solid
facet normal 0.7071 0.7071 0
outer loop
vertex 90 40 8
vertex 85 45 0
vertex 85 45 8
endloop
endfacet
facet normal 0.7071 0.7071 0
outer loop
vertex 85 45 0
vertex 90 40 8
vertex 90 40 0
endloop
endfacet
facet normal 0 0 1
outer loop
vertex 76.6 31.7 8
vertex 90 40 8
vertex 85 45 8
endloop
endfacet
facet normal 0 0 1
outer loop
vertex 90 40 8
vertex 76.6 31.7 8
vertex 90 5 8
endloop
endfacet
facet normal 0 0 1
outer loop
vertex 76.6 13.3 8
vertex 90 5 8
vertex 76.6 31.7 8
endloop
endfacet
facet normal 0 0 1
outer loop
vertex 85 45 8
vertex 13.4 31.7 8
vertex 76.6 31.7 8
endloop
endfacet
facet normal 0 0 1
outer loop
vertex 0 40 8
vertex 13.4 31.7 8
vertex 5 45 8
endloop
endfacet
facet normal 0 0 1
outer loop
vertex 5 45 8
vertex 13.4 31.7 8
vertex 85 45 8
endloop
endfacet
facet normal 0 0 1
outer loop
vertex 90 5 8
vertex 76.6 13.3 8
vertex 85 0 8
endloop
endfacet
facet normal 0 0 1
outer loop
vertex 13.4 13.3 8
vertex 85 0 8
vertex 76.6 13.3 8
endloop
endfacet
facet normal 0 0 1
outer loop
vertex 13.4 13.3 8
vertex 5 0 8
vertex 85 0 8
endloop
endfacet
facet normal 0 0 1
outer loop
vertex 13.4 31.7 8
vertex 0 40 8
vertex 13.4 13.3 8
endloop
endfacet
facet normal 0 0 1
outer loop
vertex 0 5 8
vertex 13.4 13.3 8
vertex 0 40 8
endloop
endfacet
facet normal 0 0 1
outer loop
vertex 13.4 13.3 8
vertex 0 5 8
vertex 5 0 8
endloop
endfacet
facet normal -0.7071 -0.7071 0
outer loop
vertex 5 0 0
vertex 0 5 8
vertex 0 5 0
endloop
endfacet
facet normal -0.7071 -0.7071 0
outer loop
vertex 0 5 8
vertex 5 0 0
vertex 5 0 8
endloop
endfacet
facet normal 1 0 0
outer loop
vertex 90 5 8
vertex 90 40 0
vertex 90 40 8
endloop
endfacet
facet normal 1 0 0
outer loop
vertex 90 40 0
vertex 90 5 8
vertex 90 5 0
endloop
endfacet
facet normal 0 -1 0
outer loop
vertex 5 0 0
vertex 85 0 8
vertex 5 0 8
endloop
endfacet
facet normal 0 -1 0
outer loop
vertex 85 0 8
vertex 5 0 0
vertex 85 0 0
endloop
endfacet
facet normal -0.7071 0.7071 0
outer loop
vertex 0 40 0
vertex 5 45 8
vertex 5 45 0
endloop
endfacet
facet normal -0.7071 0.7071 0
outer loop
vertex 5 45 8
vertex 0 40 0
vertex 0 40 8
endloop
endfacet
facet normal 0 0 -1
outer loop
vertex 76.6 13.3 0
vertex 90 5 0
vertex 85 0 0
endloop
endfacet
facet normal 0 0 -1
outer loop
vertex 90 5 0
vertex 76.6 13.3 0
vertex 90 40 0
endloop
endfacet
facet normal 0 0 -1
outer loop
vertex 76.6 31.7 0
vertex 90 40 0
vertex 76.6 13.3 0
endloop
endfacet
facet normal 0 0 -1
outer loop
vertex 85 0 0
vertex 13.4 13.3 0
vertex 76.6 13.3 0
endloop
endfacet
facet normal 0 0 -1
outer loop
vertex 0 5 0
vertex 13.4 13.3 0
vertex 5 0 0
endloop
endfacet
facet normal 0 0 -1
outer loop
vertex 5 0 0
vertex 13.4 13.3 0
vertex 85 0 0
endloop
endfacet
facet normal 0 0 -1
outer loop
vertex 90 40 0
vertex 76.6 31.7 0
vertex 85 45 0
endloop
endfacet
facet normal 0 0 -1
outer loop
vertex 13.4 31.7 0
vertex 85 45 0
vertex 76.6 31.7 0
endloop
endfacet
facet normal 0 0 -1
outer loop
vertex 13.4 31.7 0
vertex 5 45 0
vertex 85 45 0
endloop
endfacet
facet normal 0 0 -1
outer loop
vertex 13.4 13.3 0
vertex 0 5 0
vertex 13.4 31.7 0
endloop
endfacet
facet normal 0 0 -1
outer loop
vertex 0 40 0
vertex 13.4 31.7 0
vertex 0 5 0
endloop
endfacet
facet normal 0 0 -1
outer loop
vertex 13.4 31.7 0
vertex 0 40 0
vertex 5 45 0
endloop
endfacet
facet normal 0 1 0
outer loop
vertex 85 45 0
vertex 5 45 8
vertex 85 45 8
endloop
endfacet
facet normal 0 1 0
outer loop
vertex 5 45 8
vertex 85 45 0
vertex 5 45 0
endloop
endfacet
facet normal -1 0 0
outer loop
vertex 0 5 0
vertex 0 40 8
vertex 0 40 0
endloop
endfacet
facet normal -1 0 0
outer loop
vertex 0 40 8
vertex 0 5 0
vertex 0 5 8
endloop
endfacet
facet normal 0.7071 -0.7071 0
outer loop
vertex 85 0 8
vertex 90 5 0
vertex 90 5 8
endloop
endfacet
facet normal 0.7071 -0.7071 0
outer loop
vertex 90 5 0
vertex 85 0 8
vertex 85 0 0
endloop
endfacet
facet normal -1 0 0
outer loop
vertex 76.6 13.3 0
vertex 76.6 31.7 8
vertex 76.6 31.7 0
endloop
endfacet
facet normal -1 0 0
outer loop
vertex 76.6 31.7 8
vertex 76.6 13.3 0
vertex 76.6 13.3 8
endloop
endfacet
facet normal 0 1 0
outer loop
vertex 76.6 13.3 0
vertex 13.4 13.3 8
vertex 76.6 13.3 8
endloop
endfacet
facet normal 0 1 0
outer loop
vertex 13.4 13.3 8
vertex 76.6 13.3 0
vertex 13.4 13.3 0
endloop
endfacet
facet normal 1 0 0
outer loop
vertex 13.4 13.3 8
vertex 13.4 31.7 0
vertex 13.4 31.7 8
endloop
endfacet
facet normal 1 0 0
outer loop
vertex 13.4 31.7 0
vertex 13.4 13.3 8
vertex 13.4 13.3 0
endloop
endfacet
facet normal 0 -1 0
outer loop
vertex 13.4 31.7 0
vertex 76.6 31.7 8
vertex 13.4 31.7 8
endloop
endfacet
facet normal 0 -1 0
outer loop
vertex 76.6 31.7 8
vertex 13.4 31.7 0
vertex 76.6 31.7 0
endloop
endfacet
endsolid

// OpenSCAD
$fn = 32;

// ----------------------------------------------------------------------
// Windowed plate: 1 voids, 90 x 45 x 8 mm
// ----------------------------------------------------------------------

// --- parameters (mm) ---
plate_l = 90;             // plate length, X
plate_w = 45;             // plate width, Y
plate_t = 8;              // plate thickness, Z
edge_margin = 10;         // wall from the plate edge to any window
win1_l = 63.2;            // window length
win1_w = 18.4;            // window width
depth_1 = 8;              // depth of void 1 (full thickness = through)
corner_c = 5;             // corner chamfer of the plate

profile = [[5, 0], [85, 0], [90, 5], [90, 40], [85, 45], [5, 45], [0, 40], [0, 5]];  // primary outline, 8 points, counter clockwise
void_1 = [[13.4, 13.3], [76.6, 13.3], [76.6, 31.7], [13.4, 31.7]];  // large central window, 4 points

// --- the one profile operation ---
difference() {
  linear_extrude(height = plate_t) polygon(points = profile);
  translate([0, 0, -1])
    linear_extrude(height = plate_t + 2) polygon(points = void_1);
}
